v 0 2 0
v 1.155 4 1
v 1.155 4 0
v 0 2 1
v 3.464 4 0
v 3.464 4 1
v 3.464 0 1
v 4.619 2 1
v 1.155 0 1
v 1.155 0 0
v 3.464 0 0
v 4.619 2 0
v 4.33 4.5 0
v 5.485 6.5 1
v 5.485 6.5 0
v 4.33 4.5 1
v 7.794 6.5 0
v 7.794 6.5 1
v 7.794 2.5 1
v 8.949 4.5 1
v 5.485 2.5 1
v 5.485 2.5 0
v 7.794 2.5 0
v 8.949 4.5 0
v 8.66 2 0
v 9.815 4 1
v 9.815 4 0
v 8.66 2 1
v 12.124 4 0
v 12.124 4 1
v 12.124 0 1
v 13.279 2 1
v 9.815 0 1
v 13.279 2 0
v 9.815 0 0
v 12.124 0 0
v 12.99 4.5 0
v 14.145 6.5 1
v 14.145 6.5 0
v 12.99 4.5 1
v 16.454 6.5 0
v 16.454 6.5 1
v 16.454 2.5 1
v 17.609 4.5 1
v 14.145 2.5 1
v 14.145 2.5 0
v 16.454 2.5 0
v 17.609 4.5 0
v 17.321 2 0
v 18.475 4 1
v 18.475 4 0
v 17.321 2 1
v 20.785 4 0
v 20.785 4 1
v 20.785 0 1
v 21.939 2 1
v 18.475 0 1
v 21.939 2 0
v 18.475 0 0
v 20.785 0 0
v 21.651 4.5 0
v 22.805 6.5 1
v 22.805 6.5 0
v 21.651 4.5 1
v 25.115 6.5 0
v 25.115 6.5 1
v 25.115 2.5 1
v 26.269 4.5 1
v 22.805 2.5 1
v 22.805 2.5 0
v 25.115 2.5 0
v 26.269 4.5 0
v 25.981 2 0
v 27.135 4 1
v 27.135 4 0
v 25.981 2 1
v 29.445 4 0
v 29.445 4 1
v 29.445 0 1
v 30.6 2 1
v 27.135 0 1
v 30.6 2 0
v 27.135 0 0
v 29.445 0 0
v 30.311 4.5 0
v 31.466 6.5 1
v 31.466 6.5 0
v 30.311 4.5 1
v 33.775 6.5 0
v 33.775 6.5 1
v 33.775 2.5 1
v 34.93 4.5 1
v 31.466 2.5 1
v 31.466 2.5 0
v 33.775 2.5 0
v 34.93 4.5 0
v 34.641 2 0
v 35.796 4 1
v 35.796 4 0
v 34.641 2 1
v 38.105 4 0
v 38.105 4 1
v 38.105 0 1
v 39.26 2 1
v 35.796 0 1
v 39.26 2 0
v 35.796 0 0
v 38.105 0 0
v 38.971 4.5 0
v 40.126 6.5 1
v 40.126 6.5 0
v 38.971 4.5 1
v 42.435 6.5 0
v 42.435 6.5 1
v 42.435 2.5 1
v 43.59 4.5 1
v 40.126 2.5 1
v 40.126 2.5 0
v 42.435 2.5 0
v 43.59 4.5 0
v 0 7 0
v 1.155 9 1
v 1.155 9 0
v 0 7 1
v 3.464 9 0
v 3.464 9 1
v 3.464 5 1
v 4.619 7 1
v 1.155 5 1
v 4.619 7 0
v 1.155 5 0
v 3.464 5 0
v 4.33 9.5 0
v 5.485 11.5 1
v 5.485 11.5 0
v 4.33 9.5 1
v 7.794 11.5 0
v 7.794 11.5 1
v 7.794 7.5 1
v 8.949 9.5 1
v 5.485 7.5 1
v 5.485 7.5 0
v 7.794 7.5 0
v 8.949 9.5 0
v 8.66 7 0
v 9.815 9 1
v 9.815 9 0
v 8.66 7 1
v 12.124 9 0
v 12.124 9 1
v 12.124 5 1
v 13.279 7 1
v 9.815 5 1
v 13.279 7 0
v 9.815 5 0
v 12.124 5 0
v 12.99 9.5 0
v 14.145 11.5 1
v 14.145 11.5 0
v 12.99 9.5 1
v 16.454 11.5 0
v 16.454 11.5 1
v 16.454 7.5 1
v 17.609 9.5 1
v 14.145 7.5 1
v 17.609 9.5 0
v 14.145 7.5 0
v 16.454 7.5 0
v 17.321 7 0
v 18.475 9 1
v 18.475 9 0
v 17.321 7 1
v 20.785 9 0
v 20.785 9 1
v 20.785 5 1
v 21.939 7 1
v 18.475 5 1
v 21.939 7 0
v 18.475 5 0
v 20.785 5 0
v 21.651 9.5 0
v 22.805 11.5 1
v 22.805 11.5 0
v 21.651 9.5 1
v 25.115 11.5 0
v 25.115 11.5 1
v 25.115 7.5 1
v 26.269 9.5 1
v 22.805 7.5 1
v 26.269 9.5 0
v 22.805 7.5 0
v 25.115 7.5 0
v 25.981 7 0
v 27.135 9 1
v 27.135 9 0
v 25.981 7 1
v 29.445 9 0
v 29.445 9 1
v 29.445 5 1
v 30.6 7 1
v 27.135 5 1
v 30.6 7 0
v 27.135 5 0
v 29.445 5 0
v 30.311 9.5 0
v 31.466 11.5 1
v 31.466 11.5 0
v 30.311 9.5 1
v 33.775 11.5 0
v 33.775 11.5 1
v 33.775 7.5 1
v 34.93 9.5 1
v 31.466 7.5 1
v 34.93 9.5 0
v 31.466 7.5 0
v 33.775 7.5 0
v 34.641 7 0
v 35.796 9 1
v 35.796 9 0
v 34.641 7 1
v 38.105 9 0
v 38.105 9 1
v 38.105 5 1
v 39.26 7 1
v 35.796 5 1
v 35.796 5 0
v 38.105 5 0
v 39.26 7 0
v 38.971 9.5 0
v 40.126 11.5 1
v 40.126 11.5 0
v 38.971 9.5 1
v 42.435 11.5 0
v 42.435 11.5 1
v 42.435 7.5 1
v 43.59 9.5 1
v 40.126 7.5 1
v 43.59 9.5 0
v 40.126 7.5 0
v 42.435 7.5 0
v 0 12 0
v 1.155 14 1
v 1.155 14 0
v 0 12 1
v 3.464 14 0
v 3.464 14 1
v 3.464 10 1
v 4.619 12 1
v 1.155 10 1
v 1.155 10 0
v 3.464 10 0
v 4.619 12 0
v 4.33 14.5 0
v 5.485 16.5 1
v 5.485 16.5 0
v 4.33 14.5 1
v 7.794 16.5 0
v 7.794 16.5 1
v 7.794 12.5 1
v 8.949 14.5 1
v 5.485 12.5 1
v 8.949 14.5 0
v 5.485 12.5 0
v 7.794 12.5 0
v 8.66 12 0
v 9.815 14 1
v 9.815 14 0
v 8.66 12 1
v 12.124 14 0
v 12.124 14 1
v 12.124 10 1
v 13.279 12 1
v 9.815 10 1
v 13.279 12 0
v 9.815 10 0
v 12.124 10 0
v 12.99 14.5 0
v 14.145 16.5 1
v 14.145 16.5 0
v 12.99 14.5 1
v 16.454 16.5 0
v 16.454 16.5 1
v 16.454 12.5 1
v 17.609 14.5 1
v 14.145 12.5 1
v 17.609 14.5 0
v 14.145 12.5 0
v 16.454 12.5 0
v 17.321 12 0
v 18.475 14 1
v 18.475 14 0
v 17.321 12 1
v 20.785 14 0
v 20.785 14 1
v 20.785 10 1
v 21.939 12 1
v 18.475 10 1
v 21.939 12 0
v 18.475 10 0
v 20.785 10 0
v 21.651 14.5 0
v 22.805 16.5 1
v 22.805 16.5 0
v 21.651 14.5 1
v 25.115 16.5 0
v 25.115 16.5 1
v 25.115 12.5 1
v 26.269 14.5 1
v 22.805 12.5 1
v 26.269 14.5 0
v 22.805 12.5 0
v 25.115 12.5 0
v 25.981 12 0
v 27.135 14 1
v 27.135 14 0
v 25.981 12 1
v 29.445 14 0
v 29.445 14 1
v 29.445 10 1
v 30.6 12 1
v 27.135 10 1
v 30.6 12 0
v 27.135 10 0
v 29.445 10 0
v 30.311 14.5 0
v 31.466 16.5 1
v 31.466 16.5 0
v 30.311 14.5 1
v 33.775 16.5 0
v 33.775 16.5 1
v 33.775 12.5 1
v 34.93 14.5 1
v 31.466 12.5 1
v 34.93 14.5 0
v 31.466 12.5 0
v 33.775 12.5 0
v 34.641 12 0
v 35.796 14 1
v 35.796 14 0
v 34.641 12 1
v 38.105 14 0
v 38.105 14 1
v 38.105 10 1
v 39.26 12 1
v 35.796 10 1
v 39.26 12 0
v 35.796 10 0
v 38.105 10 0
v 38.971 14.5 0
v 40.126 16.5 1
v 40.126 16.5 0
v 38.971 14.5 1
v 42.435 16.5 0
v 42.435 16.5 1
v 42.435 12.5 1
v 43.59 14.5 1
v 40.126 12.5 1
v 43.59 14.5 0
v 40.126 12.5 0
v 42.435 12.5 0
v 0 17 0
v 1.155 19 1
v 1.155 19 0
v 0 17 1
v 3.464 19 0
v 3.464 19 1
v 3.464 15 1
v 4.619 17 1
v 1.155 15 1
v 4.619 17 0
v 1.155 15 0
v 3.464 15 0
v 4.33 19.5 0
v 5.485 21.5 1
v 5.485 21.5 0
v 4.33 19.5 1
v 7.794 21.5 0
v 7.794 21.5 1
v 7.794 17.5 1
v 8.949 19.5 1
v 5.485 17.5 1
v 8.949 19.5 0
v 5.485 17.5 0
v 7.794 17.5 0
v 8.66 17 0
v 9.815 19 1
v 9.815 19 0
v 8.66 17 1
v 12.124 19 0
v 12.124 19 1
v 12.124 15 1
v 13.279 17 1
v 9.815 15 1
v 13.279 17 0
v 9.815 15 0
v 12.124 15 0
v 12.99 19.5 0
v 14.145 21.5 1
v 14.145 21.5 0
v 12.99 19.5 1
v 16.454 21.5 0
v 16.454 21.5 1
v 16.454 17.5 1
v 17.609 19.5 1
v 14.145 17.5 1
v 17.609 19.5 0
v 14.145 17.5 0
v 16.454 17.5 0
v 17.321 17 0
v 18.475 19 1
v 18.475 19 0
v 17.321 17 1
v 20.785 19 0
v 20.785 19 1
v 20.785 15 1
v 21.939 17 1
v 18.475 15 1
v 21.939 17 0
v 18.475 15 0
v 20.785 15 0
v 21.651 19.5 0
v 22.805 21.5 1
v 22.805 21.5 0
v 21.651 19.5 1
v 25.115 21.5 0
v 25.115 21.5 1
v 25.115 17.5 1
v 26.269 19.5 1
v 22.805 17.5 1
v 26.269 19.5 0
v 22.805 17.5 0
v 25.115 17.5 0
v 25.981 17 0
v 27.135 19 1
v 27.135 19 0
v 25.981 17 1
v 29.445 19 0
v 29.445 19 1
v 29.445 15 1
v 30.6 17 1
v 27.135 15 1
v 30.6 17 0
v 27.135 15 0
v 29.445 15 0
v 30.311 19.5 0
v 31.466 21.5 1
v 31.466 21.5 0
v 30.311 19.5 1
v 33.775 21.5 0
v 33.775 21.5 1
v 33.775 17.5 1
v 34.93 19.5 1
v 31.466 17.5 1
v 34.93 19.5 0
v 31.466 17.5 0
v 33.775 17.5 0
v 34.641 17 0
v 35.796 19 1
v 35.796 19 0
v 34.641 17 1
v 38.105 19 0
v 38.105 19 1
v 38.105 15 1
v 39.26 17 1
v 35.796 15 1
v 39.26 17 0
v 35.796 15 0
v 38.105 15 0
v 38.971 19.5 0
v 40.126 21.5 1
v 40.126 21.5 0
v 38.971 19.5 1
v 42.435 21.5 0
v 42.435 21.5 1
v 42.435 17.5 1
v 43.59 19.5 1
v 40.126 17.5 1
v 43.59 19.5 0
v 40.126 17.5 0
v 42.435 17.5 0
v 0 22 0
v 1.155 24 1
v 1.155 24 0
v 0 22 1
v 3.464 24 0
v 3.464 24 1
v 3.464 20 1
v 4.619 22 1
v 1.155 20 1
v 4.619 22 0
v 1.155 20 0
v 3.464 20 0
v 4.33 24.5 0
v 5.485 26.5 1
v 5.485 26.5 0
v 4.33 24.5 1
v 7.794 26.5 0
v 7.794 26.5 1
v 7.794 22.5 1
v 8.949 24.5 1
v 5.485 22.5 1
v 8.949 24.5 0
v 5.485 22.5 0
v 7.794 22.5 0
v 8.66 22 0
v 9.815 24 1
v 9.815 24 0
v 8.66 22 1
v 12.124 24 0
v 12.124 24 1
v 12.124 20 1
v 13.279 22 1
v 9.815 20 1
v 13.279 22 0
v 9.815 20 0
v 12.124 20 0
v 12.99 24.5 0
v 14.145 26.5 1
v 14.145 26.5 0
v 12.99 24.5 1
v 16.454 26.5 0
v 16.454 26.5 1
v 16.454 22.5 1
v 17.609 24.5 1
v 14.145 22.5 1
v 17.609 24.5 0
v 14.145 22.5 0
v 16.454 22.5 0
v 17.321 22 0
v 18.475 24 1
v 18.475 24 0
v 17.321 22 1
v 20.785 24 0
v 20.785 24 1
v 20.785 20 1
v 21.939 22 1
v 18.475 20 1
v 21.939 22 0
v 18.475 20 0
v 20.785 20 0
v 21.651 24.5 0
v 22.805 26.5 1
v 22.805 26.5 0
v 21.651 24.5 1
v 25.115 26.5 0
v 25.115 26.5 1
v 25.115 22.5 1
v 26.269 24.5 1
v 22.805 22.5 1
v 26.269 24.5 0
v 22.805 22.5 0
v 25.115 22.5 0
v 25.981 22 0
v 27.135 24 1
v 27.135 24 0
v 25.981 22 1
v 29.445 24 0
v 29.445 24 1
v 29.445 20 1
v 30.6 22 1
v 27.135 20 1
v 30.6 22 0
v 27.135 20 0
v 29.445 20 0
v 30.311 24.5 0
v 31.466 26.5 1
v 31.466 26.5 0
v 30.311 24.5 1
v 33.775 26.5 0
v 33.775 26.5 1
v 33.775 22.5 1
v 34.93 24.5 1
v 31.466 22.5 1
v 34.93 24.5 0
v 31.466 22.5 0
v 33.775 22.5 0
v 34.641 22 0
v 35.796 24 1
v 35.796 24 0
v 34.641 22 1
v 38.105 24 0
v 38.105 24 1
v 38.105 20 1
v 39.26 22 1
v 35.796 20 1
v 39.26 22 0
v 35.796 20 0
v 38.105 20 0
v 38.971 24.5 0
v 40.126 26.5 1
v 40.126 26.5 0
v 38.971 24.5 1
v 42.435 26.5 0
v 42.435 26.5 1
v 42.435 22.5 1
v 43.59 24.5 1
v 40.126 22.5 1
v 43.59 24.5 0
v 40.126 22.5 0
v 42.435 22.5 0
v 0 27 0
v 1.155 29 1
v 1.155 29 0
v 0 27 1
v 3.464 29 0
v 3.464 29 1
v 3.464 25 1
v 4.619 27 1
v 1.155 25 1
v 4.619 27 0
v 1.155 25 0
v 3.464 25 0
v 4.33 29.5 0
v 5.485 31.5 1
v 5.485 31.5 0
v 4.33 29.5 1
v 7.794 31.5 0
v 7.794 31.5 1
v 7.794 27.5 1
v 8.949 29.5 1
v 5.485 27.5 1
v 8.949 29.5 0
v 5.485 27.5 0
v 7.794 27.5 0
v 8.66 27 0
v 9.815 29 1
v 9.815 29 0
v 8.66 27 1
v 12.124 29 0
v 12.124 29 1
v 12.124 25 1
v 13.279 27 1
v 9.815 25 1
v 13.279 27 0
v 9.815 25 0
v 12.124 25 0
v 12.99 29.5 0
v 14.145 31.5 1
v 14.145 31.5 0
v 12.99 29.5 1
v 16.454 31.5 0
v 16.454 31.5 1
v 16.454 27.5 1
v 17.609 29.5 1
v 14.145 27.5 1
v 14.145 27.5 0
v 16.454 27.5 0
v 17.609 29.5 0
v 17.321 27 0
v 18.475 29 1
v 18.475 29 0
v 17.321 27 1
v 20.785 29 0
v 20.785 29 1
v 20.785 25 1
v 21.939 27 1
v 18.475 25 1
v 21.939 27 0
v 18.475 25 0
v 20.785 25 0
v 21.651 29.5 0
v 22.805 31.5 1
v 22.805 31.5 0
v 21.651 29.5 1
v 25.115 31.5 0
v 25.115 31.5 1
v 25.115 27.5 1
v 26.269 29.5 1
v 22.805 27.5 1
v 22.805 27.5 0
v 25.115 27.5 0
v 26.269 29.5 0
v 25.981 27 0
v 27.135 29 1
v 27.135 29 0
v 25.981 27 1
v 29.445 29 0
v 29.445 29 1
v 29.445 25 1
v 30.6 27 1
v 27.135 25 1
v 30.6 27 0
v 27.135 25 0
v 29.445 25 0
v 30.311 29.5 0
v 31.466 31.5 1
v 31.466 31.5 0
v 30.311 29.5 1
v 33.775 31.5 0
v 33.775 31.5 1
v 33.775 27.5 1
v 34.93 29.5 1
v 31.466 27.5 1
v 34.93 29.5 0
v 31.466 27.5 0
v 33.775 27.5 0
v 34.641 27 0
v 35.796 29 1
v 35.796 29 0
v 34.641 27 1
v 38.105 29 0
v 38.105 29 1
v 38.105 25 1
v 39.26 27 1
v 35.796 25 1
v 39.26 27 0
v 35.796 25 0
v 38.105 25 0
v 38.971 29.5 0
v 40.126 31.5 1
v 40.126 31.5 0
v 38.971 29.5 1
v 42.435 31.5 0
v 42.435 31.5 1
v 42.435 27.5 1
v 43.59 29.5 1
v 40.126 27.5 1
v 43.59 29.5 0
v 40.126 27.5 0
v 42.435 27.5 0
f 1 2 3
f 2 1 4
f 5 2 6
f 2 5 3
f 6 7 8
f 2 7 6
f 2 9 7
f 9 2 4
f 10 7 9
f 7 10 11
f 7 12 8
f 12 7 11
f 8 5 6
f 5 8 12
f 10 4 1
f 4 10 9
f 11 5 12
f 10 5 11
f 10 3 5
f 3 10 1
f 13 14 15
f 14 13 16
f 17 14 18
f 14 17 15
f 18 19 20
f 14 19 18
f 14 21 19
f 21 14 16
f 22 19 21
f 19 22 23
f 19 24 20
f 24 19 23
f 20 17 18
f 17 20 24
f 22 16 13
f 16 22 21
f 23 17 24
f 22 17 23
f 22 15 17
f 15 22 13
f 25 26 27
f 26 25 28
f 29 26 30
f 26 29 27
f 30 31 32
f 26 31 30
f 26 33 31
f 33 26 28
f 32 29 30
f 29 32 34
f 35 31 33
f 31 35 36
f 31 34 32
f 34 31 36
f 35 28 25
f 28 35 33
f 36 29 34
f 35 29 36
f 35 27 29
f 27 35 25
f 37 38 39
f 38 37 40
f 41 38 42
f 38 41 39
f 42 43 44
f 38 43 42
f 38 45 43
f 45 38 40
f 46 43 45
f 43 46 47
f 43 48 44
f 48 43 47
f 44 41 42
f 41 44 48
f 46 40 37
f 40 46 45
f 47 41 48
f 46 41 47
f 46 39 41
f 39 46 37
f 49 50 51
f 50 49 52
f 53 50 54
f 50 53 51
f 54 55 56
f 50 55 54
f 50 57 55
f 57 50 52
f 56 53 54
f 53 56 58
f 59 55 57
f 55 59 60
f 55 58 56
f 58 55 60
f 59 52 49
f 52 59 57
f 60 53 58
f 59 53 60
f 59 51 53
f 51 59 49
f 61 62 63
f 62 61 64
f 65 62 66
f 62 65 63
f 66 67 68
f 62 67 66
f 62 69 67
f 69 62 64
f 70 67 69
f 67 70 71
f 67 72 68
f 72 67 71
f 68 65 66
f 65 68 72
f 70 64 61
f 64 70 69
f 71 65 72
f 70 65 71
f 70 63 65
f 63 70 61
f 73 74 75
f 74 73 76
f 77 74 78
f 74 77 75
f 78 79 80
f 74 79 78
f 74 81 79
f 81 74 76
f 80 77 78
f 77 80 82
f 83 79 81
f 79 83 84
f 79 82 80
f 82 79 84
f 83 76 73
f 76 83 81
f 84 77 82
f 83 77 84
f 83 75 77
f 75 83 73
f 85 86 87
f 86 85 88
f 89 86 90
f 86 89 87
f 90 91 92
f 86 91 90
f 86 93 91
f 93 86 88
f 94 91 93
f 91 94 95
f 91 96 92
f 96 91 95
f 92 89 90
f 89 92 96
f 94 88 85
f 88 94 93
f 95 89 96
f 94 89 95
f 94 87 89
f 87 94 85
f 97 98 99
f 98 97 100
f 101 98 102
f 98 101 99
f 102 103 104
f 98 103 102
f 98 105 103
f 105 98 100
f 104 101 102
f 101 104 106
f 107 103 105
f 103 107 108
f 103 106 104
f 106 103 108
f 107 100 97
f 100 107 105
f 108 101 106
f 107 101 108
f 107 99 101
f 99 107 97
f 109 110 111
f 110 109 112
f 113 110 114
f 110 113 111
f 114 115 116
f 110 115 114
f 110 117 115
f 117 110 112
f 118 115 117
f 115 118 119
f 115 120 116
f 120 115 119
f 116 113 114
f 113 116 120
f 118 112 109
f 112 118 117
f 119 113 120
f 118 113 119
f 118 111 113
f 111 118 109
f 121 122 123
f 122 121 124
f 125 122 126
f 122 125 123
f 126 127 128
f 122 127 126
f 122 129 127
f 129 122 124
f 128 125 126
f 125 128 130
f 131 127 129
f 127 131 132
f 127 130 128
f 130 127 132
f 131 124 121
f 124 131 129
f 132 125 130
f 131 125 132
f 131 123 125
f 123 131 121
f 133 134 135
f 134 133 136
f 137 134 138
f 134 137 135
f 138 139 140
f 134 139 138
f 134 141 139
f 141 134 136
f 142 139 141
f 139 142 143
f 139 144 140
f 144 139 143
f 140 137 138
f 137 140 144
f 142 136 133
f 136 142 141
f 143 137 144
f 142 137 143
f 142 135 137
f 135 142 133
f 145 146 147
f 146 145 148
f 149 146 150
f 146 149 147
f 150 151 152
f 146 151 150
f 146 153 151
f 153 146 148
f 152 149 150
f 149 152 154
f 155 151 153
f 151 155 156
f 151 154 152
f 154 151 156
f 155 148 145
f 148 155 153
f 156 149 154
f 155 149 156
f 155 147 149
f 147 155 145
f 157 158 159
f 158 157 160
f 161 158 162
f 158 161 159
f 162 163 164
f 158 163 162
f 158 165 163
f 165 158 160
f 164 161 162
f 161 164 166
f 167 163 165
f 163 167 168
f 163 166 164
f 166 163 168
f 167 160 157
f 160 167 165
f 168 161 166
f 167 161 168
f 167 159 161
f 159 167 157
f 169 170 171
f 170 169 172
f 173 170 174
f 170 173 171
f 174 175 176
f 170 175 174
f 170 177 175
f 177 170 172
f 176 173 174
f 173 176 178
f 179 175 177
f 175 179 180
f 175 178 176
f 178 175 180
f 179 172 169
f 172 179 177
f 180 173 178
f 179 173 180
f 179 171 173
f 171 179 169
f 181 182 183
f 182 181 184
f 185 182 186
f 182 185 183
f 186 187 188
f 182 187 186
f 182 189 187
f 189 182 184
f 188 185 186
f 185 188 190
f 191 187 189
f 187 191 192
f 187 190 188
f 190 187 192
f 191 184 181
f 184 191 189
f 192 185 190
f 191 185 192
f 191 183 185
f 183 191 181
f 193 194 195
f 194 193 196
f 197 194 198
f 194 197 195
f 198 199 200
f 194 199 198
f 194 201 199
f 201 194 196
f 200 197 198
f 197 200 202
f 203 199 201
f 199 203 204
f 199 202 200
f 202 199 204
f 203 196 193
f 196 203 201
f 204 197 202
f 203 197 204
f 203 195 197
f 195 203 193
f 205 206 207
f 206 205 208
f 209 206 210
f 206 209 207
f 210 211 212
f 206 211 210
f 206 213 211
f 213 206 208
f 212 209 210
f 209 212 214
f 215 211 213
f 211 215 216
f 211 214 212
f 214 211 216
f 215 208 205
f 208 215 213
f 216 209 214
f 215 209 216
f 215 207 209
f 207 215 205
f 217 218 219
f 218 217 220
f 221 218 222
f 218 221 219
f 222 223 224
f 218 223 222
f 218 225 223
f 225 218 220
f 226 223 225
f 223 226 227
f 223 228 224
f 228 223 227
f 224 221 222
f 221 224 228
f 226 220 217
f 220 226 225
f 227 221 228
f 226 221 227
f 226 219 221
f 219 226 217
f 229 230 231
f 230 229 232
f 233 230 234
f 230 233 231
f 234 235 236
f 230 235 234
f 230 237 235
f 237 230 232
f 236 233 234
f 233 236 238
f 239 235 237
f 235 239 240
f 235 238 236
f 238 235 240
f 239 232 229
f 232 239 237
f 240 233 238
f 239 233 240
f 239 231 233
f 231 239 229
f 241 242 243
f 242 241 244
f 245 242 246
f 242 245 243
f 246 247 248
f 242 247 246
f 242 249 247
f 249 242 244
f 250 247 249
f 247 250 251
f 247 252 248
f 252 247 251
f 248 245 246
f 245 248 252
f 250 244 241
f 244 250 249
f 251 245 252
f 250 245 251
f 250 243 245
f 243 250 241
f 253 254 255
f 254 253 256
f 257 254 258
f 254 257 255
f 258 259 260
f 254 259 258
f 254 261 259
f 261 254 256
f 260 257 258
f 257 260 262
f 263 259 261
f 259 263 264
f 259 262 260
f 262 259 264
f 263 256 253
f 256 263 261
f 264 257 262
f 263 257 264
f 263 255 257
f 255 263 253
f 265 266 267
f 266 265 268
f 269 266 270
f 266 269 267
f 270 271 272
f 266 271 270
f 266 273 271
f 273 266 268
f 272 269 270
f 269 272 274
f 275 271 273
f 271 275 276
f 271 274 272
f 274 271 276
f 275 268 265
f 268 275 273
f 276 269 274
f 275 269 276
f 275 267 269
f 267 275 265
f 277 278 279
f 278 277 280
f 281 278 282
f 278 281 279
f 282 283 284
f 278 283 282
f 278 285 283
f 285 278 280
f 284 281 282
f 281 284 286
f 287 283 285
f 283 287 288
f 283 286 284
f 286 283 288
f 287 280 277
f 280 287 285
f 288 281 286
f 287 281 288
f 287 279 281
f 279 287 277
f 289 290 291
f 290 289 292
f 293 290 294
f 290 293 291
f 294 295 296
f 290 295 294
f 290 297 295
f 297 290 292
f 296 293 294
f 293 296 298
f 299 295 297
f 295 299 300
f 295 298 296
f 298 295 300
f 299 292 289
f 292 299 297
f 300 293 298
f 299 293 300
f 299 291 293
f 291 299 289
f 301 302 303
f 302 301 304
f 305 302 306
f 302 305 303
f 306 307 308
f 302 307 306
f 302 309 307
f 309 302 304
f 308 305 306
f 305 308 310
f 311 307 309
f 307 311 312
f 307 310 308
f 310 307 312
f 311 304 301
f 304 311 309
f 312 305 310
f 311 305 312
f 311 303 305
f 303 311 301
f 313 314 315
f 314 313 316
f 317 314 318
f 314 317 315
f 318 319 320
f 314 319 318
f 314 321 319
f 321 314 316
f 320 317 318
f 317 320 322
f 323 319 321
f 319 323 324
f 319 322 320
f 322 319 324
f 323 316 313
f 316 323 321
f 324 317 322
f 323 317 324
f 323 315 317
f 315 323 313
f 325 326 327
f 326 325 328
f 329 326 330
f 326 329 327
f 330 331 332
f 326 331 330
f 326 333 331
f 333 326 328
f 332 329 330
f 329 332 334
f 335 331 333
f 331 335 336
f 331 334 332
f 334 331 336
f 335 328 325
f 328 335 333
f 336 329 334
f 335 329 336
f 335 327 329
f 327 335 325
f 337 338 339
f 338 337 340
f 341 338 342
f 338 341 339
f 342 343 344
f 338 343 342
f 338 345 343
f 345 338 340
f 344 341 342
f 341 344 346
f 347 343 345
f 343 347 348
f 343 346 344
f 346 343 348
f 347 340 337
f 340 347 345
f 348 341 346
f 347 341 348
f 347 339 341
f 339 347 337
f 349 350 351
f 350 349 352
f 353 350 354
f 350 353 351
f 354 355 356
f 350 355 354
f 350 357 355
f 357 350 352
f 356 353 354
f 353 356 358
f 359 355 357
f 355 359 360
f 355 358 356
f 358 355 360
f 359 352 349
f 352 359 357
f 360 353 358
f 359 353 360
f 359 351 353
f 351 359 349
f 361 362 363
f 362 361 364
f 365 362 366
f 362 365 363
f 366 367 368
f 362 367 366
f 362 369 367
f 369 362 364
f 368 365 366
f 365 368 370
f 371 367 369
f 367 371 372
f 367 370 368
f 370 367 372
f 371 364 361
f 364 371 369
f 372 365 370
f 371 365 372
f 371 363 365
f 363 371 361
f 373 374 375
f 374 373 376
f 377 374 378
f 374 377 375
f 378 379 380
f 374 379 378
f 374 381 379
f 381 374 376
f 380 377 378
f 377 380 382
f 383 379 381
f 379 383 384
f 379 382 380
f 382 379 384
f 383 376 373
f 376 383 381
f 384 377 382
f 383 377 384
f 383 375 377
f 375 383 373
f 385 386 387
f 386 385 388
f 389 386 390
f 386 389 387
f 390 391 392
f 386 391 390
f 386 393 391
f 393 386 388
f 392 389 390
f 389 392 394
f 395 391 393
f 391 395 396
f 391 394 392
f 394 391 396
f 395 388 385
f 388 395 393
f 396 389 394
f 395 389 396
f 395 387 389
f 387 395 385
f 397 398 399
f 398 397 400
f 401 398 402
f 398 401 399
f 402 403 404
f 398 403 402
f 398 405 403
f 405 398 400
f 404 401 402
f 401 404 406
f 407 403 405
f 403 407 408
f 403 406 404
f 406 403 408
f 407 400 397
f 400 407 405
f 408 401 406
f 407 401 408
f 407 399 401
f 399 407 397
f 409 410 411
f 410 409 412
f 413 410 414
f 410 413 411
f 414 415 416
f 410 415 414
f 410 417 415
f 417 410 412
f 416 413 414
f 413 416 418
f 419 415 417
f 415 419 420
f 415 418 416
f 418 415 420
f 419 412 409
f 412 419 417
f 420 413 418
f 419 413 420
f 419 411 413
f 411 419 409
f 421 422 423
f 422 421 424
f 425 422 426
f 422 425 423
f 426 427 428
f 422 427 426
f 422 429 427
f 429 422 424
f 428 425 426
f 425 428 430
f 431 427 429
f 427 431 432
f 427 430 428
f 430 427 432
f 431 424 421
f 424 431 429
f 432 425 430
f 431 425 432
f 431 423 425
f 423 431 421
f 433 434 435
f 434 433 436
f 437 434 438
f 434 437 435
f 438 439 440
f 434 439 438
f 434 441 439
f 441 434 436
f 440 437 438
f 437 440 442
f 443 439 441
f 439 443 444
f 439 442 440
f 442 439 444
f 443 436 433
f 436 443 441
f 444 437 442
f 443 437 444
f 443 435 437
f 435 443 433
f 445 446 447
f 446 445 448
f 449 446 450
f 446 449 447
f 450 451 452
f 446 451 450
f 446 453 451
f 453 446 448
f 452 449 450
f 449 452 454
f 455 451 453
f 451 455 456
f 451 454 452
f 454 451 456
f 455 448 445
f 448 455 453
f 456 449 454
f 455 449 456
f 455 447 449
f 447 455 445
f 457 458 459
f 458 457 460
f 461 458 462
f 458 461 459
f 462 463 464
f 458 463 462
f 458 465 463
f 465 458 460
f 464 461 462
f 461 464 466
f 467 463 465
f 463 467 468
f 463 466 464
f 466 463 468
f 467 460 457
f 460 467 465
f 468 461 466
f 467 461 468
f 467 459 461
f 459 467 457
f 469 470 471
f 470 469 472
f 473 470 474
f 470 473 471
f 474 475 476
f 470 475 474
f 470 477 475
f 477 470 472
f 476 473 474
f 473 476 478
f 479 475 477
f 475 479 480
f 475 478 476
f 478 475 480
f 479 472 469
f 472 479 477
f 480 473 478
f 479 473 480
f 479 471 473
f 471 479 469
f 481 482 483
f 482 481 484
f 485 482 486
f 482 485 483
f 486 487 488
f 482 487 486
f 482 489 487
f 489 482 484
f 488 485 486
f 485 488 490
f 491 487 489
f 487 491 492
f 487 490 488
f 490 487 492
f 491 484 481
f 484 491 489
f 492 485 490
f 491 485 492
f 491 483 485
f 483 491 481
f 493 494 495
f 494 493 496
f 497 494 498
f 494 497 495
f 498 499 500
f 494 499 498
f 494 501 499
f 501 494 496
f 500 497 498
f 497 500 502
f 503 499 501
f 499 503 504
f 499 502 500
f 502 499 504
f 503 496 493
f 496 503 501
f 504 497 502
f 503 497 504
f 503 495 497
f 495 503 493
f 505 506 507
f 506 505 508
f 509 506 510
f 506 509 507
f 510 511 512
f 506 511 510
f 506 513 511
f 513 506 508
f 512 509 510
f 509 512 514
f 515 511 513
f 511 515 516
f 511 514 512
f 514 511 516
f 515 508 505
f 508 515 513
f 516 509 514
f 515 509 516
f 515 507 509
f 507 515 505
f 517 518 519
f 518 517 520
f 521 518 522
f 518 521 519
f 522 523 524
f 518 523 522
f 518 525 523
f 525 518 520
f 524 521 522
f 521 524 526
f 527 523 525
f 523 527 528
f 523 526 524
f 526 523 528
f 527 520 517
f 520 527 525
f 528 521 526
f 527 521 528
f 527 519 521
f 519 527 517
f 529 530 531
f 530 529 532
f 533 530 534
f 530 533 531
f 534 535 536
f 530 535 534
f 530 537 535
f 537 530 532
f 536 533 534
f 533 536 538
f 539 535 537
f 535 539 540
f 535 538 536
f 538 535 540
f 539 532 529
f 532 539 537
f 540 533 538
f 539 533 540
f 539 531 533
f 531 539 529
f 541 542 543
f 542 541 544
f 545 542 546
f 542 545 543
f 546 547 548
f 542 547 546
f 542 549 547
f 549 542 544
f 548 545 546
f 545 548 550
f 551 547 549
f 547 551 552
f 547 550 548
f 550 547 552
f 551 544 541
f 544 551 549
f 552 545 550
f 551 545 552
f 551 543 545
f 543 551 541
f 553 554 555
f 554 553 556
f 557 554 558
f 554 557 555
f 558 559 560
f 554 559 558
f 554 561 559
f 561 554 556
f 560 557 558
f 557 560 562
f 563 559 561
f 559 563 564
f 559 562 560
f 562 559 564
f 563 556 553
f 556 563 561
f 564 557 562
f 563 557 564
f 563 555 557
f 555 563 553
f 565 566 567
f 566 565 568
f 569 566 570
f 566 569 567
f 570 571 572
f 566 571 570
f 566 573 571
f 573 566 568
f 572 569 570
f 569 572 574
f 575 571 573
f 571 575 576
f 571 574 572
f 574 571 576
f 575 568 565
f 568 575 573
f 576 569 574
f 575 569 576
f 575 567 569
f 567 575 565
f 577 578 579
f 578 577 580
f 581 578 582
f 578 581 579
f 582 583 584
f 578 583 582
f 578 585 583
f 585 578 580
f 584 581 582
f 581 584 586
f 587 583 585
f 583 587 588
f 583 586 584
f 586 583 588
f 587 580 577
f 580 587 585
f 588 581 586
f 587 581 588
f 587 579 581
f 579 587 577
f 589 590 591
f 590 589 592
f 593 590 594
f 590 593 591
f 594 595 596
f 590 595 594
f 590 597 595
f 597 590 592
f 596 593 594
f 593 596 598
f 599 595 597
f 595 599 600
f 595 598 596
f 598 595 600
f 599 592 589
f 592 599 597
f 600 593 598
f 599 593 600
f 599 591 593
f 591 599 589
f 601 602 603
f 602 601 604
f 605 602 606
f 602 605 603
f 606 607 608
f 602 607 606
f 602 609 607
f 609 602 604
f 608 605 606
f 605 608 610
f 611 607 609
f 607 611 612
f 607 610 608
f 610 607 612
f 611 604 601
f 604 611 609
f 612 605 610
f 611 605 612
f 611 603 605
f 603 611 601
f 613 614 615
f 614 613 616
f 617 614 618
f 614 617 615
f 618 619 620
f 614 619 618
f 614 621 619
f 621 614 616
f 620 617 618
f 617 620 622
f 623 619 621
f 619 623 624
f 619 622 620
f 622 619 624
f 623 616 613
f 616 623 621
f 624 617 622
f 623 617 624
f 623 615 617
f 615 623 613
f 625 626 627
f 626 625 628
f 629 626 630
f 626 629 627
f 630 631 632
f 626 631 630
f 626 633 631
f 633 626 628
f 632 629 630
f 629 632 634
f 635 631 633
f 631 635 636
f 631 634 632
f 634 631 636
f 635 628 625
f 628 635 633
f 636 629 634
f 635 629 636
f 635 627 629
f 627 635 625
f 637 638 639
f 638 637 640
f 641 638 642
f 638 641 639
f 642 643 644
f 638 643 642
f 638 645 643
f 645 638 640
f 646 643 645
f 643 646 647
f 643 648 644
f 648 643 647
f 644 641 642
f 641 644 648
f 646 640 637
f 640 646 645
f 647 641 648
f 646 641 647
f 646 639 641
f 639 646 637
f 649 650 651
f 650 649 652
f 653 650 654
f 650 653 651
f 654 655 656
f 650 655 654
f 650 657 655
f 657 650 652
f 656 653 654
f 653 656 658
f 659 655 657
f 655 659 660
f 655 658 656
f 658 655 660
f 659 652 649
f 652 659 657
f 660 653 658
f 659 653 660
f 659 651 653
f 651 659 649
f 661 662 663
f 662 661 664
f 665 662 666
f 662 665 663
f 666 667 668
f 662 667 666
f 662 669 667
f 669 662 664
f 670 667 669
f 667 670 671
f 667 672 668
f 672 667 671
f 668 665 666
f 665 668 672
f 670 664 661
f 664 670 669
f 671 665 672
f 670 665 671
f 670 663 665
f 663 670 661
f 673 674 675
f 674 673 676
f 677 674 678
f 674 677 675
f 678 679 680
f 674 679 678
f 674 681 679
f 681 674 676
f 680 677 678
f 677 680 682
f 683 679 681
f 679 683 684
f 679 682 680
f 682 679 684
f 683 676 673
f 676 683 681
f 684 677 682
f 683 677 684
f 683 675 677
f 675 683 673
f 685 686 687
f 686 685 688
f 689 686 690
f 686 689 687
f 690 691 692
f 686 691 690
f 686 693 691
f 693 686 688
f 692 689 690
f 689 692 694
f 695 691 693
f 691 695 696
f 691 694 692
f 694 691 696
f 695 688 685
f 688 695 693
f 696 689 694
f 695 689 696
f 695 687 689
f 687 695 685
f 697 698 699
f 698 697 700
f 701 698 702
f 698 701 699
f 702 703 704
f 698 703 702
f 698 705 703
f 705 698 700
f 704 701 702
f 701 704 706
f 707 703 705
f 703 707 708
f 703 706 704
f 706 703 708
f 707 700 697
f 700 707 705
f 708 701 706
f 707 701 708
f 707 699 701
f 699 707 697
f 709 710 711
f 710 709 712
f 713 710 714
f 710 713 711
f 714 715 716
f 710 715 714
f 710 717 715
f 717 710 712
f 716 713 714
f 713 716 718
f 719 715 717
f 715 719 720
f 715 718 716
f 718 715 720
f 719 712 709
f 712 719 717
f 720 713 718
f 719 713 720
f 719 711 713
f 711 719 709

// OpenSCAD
$fn=50;
nof = 0.001;

module donut(inner_radius, body_radius) {
    rotate_extrude(convexity=10)
    translate([inner_radius,0,0])
    circle(r=body_radius);
}

// helper module for making sets of columns
module four_cols(v1, v2, rots, t, r, h) {
    for (i = v1, j = v2) {
        rotate(rots)
        translate([i, j, t])
        cylinder(r = r, h = h);
    }
}

// cuboid with filleted edges on the bottom
module bottom_rrect(radius, width, length, height, bradius) {
    // Vertical columns
    for (i = [radius, length - radius]) {
        for (j = [radius, width - radius]) {
            translate([i, j, bradius])
            cylinder(r=radius, h=height-bradius);
            
            translate([i, j, bradius])
            donut(radius-bradius, bradius);
            
            translate([i, j, 0])
            cylinder(r=radius-bradius, h=bradius);
        }
    }

    // x-axis cylinders
    four_cols([-bradius], [bradius, width-bradius], [0,90,0], radius, bradius, length-(2*radius));
    
    // y-axis cylinders
    color("red")
    four_cols([length, bradius], [bradius],[90,0,0], radius, bradius, -width + radius);
    four_cols([bradius, length - bradius], [bradius], [90,0,0], -width + radius, bradius, width - (2 * radius));
   
    // top fill cuboids
    translate([radius,0,bradius])
    cube([length-(2*radius), width, height-bradius]);
    translate([0,radius,bradius])
    cube([length, width-(2*radius), height-bradius]);
    
    // bottom fill cuboids
    translate([radius,bradius,0])
    cube([length-(2*radius), width-(2*bradius), bradius]);
    translate([bradius,radius,0])
    cube([length-(2*bradius), width-(2*radius), bradius]);
}

// cuboid where corners on one axis are rounded
module rrect(radius, length, width, height, vert=false) {
    // width is x-axis, length is y-axis
    w_space = width - (2 * radius);
    l_space = length - (2  * radius);
    for (i = [0, w_space], j = [0, l_space]) {
        translate([i+radius, j+radius, 0])
        cylinder(height, radius, radius);
    }
    translate([radius, 0, 0])
    cube([w_space, length, height]);
    translate([0,radius, 0])
    cube([width, l_space, height]);
}


// cuboid that is fully rounded all around
module full_rrect(radius, length, width, height) {
    translate([radius, radius, radius]) {
        four_cols([0, length], [0, width], [0, 0, 0], 0, radius, height);
        four_cols([0, -height],[0, width],[0, 90, 0], 0, radius, length);
        four_cols([0, length],[0, height],[90, 0, 0],-width,radius,width);
    
        for (i = [0, length], j = [0, width], k = [0, height]) {
            translate([i, j, k])
            sphere(radius);
        }
        
        translate([0,0,-radius])
        cube([length, width, height+(2*radius)]);
        translate([0,-radius,0])
        cube([length, width+(2*radius), height]);
        translate([-radius,0,0])
        cube([length+(2*radius), width, height]);
    }
}

function hex_wid(x) = x / tan(60);

function hex_rad(x) = sqrt((x ^ 2) + (hex_wid(x) ^ 2));

function hex_ful(x) = (2 * hex_wid(x)) + hex_rad(x);

function hex_dim(x) = [hex_wid(x), hex_rad(x), hex_ful(x)];

module hexadron(tall, height) {
    wide   = hex_wid(tall);
    radius = hex_rad(tall);
    linear_extrude(height) {
        polygon(
            [[tall, 0], [2 * tall, wide], [2 * tall, wide + radius],
            [tall, (2 * wide) + radius], [0, wide + radius],[0, wide]]
        );
    }
}

module hex_tile(tall, height, thick) {
    // A whole bunch of trig garbage, there's probably a better way
    ntall  = tall - thick;
    ndims  = hex_dim(ntall);
    dims   = hex_dim(tall);
    wide   = hex_wid(tall);
    radius = hex_rad(tall);
    del    = (dims[2] - ndims[2]) / 2;
    
    difference() {
        hexadron(tall, height);
        translate([thick, del, -nof])
        hexadron(ntall, height + (2 * nof));
    }
}

function hex_row_int_h(thick)      = sqrt(thick^2 - (thick / 2)^2);
function hex_row_h1(tall, ntall)   = (hex_ful(tall) - hex_ful(ntall)) / 2;
function hex_row_h2(tall, ntall)   = hex_wid(ntall) + 
                                     hex_row_h1(tall, ntall) -
                                     hex_row_int_h(ntall - tall);
function hex_row_yoff(tall, ntall) = hex_ful(tall) - 
                                     hex_row_h1(tall, ntall) - 
                                     hex_row_h2(tall, ntall);
                                     
module hex_mat(rows, cols, thick, tall, height) {
    ntall  = tall - thick;
    dims   = hex_dim(tall);
    ndims  = hex_dim(ntall);
    off    = dims[2] - thick;
    ftall  = 2 * tall;
    xoff   = ftall - thick;
    yoff   = hex_row_yoff(tall, ntall);
    
    for (i = [0:cols], j = [0:rows]) {
        odd = (j % 2) * (tall - (thick / 2));
        rotate([0,0,90])
        translate([(xoff * i) + odd, -dims[2] - (j * yoff), 0])
        hex_tile(tall, height, thick);
    }
}

module hex_diff(rows, cols, thick, tall, height) {
    ntall  = tall - thick;
    dims   = hex_dim(tall);
    ndims  = hex_dim(ntall);
    ftall  = 2 * tall;
    xoff   = ftall - thick;
    yoff   = hex_row_yoff(tall, ntall);
    
    for (i = [0:(cols-1)], j = [0:(rows-1)]) {
        odd = (j % 2) * (tall - (thick / 2));
        rotate([0,0,90])
        translate([(xoff * i) + odd, -ndims[2] -(j * yoff), 0])
        hexadron(tall - thick, height);
    }
}

hex_diff(10, 6, 1, 3, 1);
